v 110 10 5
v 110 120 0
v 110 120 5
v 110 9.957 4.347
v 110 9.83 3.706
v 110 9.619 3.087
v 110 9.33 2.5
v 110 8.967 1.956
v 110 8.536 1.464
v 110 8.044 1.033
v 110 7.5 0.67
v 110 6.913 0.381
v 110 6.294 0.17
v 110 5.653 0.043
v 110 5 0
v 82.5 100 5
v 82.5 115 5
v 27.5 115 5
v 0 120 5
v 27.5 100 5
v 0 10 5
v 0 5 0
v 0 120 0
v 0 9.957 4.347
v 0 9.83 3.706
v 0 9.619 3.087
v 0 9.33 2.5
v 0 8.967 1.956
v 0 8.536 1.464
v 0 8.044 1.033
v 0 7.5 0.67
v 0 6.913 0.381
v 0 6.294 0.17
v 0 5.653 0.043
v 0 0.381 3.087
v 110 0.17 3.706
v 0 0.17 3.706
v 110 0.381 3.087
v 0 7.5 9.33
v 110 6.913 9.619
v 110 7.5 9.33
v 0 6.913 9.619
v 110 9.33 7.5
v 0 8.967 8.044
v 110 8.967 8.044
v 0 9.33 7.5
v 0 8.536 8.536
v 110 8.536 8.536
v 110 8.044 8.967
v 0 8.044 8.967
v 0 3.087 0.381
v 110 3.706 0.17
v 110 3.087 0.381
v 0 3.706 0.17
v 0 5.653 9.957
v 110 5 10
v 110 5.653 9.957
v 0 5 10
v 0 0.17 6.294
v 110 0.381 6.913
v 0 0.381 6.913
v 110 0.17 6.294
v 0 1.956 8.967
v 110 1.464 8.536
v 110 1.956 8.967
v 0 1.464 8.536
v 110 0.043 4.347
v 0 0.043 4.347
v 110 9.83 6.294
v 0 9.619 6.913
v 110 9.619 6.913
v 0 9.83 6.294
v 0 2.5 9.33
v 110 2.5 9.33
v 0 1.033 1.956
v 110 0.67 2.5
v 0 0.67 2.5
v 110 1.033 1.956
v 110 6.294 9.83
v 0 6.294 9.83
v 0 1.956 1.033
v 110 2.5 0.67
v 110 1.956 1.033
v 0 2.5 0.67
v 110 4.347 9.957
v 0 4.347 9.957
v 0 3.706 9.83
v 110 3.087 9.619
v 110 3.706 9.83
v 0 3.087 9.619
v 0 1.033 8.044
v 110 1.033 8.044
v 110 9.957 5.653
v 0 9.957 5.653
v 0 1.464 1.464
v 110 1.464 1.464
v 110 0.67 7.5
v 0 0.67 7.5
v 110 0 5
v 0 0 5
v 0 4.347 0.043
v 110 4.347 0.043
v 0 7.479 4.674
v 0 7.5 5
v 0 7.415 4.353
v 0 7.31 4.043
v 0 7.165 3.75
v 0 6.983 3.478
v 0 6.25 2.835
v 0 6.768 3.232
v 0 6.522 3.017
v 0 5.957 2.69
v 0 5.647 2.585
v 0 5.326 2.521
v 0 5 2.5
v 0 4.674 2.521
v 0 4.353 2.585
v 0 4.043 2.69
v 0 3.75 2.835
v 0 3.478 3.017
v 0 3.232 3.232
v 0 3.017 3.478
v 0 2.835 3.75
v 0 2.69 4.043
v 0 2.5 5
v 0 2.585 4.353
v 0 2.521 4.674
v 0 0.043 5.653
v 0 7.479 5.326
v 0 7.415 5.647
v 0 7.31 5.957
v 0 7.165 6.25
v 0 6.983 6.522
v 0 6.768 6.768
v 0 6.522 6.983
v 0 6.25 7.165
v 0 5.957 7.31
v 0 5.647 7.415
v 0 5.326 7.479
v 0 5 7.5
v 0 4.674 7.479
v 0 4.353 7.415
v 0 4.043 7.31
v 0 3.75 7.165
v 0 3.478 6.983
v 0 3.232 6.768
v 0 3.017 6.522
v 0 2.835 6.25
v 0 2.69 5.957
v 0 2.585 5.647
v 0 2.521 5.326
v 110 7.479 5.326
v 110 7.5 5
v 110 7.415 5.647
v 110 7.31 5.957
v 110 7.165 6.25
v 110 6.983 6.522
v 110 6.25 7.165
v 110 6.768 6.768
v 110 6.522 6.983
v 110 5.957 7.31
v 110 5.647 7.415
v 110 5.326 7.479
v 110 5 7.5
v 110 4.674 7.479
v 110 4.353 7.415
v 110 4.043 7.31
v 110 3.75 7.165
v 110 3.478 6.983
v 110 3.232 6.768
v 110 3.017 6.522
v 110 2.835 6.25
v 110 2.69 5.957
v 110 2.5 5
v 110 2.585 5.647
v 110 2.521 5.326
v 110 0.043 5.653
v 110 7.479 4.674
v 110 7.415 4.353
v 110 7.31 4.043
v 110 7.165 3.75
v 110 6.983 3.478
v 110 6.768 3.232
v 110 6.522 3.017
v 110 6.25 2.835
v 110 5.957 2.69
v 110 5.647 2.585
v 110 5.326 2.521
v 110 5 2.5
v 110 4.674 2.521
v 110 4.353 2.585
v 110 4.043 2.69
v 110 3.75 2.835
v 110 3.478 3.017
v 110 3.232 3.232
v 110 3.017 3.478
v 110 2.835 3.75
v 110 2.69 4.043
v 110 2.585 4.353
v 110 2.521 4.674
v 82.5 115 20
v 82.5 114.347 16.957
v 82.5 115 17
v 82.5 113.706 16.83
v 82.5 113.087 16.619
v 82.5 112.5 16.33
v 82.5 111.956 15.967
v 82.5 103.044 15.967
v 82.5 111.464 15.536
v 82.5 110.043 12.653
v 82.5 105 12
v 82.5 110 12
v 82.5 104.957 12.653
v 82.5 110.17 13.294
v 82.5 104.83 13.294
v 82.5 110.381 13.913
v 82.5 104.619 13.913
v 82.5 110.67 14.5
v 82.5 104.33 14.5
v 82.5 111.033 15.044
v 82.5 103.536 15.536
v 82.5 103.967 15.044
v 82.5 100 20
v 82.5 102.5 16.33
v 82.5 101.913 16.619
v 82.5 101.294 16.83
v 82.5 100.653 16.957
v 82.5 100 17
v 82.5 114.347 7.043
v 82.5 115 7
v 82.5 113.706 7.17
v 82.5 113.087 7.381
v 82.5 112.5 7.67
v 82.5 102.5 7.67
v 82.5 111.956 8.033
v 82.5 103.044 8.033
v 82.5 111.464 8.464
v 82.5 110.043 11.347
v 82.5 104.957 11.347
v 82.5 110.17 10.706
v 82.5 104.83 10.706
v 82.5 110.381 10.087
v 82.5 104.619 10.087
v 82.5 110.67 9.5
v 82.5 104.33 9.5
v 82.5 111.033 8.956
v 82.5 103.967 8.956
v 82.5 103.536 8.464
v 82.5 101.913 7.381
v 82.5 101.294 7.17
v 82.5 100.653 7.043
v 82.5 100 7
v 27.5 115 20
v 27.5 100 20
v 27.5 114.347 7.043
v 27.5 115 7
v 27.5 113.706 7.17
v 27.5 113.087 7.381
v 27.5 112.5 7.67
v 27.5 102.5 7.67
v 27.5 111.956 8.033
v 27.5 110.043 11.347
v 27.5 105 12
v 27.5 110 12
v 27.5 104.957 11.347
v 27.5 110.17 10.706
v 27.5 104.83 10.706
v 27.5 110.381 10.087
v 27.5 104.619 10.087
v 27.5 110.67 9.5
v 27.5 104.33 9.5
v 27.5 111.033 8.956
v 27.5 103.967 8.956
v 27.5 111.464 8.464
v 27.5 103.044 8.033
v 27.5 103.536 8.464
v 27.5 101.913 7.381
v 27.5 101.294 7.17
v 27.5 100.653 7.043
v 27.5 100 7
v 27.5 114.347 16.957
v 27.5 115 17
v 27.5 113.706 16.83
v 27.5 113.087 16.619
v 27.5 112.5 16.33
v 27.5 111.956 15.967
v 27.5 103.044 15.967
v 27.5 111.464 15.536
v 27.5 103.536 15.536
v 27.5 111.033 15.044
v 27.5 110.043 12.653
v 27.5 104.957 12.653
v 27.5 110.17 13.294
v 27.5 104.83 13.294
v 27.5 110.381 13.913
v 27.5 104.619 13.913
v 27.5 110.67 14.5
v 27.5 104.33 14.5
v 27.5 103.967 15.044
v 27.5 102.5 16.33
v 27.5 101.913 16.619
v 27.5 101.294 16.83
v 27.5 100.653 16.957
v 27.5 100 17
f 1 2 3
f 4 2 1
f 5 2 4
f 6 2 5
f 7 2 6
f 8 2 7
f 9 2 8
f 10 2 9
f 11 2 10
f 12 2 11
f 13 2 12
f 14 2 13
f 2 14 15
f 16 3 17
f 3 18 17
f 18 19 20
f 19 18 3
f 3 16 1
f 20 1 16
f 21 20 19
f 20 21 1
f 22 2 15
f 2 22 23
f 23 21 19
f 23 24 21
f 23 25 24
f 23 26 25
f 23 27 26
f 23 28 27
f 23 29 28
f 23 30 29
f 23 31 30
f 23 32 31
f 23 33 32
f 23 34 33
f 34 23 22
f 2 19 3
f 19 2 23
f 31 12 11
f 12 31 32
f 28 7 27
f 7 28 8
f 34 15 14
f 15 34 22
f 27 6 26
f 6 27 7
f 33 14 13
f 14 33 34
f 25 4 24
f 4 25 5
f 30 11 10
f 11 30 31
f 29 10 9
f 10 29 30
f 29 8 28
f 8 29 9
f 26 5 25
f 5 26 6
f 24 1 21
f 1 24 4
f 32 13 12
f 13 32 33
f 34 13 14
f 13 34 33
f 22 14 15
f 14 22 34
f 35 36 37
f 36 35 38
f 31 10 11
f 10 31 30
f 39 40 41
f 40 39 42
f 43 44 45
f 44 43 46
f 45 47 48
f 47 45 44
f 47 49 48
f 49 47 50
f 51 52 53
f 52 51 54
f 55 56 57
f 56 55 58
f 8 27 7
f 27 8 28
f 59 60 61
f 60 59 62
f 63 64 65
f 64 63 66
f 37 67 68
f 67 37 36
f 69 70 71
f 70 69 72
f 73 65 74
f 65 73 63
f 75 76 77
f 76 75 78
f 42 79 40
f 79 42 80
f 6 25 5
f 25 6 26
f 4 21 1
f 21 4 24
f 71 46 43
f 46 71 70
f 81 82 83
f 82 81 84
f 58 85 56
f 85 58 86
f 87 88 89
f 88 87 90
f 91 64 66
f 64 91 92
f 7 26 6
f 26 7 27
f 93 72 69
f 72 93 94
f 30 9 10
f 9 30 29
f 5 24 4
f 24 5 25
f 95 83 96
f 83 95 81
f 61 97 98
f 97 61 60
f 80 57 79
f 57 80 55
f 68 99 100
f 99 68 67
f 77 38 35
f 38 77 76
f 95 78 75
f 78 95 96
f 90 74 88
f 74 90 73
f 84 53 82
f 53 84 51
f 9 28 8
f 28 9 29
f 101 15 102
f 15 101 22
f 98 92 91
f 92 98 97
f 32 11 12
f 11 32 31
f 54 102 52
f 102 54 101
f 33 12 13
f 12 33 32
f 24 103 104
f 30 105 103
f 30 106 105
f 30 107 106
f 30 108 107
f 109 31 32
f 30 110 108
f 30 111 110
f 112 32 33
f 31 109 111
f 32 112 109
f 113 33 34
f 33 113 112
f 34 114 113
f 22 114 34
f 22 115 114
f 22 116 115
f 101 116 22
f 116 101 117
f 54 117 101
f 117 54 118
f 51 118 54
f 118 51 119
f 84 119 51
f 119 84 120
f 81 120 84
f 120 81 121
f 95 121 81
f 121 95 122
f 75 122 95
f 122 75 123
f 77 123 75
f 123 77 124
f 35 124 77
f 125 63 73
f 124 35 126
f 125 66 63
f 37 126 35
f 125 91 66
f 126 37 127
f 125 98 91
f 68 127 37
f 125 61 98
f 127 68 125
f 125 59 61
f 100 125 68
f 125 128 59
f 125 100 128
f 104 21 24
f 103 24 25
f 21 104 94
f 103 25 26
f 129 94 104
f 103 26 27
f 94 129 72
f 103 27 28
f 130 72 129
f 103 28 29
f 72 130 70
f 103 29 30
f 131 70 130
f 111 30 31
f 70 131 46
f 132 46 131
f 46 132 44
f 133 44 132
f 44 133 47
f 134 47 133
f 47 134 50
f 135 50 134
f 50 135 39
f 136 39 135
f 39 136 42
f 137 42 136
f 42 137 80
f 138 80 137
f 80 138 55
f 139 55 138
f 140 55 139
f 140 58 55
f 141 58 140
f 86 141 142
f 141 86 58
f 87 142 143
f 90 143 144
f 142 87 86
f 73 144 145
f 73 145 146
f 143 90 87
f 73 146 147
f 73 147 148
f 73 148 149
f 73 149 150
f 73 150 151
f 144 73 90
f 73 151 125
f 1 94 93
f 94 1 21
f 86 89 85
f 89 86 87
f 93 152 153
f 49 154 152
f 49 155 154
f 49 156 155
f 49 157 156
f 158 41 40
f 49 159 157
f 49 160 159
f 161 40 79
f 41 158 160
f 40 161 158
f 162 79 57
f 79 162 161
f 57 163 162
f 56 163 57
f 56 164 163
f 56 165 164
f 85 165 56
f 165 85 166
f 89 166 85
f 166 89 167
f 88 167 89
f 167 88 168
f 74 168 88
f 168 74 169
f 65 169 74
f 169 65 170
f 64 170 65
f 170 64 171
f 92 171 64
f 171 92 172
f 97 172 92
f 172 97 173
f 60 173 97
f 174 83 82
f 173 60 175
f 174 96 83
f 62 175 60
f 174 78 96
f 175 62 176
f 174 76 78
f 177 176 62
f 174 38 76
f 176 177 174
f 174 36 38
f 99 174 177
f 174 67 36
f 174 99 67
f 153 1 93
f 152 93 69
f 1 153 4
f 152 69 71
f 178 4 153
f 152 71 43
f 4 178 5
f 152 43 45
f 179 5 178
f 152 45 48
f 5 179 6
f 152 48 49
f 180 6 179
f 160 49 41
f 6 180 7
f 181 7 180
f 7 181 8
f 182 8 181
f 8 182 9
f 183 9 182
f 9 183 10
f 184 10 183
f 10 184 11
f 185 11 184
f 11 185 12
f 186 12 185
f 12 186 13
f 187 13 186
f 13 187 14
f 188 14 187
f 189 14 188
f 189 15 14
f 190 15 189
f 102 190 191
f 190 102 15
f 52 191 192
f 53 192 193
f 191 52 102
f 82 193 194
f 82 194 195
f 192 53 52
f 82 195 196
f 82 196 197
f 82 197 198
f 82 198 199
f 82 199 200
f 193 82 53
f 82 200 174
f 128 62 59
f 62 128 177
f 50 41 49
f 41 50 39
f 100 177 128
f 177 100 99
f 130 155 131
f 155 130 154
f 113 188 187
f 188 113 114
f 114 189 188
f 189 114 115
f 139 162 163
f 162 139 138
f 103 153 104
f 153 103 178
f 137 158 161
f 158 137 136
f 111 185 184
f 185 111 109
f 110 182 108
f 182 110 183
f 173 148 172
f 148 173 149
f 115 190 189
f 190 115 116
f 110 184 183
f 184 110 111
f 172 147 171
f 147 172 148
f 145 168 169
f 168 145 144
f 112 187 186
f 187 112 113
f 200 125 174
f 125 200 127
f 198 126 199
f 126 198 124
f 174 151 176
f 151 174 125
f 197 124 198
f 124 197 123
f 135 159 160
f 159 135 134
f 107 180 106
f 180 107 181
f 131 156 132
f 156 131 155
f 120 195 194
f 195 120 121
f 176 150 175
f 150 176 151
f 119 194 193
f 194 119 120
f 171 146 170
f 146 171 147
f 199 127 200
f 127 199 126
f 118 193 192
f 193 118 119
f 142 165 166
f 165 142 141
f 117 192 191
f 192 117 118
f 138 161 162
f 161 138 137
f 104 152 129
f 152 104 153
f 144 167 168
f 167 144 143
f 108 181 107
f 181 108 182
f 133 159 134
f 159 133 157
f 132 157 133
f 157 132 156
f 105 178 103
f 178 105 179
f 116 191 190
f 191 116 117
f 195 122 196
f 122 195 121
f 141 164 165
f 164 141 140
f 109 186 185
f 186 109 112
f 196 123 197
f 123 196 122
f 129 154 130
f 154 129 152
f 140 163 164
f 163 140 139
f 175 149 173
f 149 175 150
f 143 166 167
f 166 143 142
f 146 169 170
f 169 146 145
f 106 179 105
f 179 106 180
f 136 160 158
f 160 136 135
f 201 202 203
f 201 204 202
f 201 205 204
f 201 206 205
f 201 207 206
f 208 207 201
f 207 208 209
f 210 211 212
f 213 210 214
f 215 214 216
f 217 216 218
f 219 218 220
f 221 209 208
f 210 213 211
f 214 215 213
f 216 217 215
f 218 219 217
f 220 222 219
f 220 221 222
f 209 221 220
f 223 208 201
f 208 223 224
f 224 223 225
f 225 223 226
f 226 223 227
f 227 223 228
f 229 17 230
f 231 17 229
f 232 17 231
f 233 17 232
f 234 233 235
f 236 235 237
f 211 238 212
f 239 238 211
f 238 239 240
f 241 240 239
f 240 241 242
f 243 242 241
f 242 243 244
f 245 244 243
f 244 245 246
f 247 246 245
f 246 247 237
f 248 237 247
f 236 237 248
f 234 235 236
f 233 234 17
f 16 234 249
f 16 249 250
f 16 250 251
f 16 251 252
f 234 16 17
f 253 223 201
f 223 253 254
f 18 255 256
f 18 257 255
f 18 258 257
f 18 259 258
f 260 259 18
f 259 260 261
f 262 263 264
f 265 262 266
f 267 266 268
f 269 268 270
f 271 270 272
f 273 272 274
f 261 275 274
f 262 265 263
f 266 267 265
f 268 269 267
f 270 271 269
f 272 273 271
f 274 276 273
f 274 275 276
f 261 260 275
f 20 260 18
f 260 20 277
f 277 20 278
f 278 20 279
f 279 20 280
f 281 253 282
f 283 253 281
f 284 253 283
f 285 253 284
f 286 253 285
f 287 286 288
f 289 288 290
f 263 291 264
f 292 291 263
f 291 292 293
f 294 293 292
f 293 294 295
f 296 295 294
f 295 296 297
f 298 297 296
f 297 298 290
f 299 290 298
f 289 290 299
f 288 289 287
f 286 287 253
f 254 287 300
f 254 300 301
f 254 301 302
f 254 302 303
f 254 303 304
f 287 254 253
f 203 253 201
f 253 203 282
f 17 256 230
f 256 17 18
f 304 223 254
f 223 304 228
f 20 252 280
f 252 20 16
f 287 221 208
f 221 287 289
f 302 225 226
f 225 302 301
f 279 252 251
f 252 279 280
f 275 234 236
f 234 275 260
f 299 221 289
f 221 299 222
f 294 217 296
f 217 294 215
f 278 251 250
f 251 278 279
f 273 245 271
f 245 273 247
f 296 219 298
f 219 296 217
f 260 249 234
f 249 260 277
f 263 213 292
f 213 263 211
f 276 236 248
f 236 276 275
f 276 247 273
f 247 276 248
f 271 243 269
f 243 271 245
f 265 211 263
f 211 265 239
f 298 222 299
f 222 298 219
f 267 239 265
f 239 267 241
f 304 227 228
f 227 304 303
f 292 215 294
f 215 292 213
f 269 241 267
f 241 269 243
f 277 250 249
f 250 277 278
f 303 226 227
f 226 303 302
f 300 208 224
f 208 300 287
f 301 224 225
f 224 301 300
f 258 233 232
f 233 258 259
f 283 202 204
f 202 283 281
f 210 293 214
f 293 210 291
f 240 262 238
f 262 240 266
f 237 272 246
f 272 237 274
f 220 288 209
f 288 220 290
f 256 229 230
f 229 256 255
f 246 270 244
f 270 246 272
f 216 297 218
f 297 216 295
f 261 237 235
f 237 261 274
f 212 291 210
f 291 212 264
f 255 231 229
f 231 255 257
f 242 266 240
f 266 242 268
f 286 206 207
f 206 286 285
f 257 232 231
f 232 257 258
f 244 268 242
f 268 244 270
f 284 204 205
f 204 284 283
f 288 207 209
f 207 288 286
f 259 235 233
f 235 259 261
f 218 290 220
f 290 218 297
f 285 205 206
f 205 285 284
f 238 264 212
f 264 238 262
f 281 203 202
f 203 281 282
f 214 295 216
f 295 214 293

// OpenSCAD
$fn =48;
wall_thickness = 5;
wall_width = 120;
difference(){
translate([0,5,0])
cube([wall_width-2*wall_thickness,wall_width-wall_thickness,wall_thickness]);

rotate([0,90,0]){
    translate([-5,wall_thickness,-5]){
        difference(){
            cylinder(d = 10, h = wall_width);  
        }
            }
        }
    }
difference(){
rotate([0,90,0]){
   translate([-5,wall_thickness,0]){
     difference(){
        cylinder(d = 10, h = wall_width-2*wall_thickness);
         translate([0,0,-5])
            cylinder(d = 5, h = wall_width);  
      }
        }
        
}
}

// handle
translate([(wall_width-wall_thickness*2)/4,wall_width-4*wall_thickness,wall_thickness])
    difference(){
        cube([55,15,15]);
        translate([-5,0,7]){
        rotate([0,90,0]){
            
            cylinder(h = 100, r = 5);
            }
        }
         translate([-5,15,7]){   
            rotate([0,90,0]){
            
            cylinder(h = 100, r = 5);
            }
        }
    }
